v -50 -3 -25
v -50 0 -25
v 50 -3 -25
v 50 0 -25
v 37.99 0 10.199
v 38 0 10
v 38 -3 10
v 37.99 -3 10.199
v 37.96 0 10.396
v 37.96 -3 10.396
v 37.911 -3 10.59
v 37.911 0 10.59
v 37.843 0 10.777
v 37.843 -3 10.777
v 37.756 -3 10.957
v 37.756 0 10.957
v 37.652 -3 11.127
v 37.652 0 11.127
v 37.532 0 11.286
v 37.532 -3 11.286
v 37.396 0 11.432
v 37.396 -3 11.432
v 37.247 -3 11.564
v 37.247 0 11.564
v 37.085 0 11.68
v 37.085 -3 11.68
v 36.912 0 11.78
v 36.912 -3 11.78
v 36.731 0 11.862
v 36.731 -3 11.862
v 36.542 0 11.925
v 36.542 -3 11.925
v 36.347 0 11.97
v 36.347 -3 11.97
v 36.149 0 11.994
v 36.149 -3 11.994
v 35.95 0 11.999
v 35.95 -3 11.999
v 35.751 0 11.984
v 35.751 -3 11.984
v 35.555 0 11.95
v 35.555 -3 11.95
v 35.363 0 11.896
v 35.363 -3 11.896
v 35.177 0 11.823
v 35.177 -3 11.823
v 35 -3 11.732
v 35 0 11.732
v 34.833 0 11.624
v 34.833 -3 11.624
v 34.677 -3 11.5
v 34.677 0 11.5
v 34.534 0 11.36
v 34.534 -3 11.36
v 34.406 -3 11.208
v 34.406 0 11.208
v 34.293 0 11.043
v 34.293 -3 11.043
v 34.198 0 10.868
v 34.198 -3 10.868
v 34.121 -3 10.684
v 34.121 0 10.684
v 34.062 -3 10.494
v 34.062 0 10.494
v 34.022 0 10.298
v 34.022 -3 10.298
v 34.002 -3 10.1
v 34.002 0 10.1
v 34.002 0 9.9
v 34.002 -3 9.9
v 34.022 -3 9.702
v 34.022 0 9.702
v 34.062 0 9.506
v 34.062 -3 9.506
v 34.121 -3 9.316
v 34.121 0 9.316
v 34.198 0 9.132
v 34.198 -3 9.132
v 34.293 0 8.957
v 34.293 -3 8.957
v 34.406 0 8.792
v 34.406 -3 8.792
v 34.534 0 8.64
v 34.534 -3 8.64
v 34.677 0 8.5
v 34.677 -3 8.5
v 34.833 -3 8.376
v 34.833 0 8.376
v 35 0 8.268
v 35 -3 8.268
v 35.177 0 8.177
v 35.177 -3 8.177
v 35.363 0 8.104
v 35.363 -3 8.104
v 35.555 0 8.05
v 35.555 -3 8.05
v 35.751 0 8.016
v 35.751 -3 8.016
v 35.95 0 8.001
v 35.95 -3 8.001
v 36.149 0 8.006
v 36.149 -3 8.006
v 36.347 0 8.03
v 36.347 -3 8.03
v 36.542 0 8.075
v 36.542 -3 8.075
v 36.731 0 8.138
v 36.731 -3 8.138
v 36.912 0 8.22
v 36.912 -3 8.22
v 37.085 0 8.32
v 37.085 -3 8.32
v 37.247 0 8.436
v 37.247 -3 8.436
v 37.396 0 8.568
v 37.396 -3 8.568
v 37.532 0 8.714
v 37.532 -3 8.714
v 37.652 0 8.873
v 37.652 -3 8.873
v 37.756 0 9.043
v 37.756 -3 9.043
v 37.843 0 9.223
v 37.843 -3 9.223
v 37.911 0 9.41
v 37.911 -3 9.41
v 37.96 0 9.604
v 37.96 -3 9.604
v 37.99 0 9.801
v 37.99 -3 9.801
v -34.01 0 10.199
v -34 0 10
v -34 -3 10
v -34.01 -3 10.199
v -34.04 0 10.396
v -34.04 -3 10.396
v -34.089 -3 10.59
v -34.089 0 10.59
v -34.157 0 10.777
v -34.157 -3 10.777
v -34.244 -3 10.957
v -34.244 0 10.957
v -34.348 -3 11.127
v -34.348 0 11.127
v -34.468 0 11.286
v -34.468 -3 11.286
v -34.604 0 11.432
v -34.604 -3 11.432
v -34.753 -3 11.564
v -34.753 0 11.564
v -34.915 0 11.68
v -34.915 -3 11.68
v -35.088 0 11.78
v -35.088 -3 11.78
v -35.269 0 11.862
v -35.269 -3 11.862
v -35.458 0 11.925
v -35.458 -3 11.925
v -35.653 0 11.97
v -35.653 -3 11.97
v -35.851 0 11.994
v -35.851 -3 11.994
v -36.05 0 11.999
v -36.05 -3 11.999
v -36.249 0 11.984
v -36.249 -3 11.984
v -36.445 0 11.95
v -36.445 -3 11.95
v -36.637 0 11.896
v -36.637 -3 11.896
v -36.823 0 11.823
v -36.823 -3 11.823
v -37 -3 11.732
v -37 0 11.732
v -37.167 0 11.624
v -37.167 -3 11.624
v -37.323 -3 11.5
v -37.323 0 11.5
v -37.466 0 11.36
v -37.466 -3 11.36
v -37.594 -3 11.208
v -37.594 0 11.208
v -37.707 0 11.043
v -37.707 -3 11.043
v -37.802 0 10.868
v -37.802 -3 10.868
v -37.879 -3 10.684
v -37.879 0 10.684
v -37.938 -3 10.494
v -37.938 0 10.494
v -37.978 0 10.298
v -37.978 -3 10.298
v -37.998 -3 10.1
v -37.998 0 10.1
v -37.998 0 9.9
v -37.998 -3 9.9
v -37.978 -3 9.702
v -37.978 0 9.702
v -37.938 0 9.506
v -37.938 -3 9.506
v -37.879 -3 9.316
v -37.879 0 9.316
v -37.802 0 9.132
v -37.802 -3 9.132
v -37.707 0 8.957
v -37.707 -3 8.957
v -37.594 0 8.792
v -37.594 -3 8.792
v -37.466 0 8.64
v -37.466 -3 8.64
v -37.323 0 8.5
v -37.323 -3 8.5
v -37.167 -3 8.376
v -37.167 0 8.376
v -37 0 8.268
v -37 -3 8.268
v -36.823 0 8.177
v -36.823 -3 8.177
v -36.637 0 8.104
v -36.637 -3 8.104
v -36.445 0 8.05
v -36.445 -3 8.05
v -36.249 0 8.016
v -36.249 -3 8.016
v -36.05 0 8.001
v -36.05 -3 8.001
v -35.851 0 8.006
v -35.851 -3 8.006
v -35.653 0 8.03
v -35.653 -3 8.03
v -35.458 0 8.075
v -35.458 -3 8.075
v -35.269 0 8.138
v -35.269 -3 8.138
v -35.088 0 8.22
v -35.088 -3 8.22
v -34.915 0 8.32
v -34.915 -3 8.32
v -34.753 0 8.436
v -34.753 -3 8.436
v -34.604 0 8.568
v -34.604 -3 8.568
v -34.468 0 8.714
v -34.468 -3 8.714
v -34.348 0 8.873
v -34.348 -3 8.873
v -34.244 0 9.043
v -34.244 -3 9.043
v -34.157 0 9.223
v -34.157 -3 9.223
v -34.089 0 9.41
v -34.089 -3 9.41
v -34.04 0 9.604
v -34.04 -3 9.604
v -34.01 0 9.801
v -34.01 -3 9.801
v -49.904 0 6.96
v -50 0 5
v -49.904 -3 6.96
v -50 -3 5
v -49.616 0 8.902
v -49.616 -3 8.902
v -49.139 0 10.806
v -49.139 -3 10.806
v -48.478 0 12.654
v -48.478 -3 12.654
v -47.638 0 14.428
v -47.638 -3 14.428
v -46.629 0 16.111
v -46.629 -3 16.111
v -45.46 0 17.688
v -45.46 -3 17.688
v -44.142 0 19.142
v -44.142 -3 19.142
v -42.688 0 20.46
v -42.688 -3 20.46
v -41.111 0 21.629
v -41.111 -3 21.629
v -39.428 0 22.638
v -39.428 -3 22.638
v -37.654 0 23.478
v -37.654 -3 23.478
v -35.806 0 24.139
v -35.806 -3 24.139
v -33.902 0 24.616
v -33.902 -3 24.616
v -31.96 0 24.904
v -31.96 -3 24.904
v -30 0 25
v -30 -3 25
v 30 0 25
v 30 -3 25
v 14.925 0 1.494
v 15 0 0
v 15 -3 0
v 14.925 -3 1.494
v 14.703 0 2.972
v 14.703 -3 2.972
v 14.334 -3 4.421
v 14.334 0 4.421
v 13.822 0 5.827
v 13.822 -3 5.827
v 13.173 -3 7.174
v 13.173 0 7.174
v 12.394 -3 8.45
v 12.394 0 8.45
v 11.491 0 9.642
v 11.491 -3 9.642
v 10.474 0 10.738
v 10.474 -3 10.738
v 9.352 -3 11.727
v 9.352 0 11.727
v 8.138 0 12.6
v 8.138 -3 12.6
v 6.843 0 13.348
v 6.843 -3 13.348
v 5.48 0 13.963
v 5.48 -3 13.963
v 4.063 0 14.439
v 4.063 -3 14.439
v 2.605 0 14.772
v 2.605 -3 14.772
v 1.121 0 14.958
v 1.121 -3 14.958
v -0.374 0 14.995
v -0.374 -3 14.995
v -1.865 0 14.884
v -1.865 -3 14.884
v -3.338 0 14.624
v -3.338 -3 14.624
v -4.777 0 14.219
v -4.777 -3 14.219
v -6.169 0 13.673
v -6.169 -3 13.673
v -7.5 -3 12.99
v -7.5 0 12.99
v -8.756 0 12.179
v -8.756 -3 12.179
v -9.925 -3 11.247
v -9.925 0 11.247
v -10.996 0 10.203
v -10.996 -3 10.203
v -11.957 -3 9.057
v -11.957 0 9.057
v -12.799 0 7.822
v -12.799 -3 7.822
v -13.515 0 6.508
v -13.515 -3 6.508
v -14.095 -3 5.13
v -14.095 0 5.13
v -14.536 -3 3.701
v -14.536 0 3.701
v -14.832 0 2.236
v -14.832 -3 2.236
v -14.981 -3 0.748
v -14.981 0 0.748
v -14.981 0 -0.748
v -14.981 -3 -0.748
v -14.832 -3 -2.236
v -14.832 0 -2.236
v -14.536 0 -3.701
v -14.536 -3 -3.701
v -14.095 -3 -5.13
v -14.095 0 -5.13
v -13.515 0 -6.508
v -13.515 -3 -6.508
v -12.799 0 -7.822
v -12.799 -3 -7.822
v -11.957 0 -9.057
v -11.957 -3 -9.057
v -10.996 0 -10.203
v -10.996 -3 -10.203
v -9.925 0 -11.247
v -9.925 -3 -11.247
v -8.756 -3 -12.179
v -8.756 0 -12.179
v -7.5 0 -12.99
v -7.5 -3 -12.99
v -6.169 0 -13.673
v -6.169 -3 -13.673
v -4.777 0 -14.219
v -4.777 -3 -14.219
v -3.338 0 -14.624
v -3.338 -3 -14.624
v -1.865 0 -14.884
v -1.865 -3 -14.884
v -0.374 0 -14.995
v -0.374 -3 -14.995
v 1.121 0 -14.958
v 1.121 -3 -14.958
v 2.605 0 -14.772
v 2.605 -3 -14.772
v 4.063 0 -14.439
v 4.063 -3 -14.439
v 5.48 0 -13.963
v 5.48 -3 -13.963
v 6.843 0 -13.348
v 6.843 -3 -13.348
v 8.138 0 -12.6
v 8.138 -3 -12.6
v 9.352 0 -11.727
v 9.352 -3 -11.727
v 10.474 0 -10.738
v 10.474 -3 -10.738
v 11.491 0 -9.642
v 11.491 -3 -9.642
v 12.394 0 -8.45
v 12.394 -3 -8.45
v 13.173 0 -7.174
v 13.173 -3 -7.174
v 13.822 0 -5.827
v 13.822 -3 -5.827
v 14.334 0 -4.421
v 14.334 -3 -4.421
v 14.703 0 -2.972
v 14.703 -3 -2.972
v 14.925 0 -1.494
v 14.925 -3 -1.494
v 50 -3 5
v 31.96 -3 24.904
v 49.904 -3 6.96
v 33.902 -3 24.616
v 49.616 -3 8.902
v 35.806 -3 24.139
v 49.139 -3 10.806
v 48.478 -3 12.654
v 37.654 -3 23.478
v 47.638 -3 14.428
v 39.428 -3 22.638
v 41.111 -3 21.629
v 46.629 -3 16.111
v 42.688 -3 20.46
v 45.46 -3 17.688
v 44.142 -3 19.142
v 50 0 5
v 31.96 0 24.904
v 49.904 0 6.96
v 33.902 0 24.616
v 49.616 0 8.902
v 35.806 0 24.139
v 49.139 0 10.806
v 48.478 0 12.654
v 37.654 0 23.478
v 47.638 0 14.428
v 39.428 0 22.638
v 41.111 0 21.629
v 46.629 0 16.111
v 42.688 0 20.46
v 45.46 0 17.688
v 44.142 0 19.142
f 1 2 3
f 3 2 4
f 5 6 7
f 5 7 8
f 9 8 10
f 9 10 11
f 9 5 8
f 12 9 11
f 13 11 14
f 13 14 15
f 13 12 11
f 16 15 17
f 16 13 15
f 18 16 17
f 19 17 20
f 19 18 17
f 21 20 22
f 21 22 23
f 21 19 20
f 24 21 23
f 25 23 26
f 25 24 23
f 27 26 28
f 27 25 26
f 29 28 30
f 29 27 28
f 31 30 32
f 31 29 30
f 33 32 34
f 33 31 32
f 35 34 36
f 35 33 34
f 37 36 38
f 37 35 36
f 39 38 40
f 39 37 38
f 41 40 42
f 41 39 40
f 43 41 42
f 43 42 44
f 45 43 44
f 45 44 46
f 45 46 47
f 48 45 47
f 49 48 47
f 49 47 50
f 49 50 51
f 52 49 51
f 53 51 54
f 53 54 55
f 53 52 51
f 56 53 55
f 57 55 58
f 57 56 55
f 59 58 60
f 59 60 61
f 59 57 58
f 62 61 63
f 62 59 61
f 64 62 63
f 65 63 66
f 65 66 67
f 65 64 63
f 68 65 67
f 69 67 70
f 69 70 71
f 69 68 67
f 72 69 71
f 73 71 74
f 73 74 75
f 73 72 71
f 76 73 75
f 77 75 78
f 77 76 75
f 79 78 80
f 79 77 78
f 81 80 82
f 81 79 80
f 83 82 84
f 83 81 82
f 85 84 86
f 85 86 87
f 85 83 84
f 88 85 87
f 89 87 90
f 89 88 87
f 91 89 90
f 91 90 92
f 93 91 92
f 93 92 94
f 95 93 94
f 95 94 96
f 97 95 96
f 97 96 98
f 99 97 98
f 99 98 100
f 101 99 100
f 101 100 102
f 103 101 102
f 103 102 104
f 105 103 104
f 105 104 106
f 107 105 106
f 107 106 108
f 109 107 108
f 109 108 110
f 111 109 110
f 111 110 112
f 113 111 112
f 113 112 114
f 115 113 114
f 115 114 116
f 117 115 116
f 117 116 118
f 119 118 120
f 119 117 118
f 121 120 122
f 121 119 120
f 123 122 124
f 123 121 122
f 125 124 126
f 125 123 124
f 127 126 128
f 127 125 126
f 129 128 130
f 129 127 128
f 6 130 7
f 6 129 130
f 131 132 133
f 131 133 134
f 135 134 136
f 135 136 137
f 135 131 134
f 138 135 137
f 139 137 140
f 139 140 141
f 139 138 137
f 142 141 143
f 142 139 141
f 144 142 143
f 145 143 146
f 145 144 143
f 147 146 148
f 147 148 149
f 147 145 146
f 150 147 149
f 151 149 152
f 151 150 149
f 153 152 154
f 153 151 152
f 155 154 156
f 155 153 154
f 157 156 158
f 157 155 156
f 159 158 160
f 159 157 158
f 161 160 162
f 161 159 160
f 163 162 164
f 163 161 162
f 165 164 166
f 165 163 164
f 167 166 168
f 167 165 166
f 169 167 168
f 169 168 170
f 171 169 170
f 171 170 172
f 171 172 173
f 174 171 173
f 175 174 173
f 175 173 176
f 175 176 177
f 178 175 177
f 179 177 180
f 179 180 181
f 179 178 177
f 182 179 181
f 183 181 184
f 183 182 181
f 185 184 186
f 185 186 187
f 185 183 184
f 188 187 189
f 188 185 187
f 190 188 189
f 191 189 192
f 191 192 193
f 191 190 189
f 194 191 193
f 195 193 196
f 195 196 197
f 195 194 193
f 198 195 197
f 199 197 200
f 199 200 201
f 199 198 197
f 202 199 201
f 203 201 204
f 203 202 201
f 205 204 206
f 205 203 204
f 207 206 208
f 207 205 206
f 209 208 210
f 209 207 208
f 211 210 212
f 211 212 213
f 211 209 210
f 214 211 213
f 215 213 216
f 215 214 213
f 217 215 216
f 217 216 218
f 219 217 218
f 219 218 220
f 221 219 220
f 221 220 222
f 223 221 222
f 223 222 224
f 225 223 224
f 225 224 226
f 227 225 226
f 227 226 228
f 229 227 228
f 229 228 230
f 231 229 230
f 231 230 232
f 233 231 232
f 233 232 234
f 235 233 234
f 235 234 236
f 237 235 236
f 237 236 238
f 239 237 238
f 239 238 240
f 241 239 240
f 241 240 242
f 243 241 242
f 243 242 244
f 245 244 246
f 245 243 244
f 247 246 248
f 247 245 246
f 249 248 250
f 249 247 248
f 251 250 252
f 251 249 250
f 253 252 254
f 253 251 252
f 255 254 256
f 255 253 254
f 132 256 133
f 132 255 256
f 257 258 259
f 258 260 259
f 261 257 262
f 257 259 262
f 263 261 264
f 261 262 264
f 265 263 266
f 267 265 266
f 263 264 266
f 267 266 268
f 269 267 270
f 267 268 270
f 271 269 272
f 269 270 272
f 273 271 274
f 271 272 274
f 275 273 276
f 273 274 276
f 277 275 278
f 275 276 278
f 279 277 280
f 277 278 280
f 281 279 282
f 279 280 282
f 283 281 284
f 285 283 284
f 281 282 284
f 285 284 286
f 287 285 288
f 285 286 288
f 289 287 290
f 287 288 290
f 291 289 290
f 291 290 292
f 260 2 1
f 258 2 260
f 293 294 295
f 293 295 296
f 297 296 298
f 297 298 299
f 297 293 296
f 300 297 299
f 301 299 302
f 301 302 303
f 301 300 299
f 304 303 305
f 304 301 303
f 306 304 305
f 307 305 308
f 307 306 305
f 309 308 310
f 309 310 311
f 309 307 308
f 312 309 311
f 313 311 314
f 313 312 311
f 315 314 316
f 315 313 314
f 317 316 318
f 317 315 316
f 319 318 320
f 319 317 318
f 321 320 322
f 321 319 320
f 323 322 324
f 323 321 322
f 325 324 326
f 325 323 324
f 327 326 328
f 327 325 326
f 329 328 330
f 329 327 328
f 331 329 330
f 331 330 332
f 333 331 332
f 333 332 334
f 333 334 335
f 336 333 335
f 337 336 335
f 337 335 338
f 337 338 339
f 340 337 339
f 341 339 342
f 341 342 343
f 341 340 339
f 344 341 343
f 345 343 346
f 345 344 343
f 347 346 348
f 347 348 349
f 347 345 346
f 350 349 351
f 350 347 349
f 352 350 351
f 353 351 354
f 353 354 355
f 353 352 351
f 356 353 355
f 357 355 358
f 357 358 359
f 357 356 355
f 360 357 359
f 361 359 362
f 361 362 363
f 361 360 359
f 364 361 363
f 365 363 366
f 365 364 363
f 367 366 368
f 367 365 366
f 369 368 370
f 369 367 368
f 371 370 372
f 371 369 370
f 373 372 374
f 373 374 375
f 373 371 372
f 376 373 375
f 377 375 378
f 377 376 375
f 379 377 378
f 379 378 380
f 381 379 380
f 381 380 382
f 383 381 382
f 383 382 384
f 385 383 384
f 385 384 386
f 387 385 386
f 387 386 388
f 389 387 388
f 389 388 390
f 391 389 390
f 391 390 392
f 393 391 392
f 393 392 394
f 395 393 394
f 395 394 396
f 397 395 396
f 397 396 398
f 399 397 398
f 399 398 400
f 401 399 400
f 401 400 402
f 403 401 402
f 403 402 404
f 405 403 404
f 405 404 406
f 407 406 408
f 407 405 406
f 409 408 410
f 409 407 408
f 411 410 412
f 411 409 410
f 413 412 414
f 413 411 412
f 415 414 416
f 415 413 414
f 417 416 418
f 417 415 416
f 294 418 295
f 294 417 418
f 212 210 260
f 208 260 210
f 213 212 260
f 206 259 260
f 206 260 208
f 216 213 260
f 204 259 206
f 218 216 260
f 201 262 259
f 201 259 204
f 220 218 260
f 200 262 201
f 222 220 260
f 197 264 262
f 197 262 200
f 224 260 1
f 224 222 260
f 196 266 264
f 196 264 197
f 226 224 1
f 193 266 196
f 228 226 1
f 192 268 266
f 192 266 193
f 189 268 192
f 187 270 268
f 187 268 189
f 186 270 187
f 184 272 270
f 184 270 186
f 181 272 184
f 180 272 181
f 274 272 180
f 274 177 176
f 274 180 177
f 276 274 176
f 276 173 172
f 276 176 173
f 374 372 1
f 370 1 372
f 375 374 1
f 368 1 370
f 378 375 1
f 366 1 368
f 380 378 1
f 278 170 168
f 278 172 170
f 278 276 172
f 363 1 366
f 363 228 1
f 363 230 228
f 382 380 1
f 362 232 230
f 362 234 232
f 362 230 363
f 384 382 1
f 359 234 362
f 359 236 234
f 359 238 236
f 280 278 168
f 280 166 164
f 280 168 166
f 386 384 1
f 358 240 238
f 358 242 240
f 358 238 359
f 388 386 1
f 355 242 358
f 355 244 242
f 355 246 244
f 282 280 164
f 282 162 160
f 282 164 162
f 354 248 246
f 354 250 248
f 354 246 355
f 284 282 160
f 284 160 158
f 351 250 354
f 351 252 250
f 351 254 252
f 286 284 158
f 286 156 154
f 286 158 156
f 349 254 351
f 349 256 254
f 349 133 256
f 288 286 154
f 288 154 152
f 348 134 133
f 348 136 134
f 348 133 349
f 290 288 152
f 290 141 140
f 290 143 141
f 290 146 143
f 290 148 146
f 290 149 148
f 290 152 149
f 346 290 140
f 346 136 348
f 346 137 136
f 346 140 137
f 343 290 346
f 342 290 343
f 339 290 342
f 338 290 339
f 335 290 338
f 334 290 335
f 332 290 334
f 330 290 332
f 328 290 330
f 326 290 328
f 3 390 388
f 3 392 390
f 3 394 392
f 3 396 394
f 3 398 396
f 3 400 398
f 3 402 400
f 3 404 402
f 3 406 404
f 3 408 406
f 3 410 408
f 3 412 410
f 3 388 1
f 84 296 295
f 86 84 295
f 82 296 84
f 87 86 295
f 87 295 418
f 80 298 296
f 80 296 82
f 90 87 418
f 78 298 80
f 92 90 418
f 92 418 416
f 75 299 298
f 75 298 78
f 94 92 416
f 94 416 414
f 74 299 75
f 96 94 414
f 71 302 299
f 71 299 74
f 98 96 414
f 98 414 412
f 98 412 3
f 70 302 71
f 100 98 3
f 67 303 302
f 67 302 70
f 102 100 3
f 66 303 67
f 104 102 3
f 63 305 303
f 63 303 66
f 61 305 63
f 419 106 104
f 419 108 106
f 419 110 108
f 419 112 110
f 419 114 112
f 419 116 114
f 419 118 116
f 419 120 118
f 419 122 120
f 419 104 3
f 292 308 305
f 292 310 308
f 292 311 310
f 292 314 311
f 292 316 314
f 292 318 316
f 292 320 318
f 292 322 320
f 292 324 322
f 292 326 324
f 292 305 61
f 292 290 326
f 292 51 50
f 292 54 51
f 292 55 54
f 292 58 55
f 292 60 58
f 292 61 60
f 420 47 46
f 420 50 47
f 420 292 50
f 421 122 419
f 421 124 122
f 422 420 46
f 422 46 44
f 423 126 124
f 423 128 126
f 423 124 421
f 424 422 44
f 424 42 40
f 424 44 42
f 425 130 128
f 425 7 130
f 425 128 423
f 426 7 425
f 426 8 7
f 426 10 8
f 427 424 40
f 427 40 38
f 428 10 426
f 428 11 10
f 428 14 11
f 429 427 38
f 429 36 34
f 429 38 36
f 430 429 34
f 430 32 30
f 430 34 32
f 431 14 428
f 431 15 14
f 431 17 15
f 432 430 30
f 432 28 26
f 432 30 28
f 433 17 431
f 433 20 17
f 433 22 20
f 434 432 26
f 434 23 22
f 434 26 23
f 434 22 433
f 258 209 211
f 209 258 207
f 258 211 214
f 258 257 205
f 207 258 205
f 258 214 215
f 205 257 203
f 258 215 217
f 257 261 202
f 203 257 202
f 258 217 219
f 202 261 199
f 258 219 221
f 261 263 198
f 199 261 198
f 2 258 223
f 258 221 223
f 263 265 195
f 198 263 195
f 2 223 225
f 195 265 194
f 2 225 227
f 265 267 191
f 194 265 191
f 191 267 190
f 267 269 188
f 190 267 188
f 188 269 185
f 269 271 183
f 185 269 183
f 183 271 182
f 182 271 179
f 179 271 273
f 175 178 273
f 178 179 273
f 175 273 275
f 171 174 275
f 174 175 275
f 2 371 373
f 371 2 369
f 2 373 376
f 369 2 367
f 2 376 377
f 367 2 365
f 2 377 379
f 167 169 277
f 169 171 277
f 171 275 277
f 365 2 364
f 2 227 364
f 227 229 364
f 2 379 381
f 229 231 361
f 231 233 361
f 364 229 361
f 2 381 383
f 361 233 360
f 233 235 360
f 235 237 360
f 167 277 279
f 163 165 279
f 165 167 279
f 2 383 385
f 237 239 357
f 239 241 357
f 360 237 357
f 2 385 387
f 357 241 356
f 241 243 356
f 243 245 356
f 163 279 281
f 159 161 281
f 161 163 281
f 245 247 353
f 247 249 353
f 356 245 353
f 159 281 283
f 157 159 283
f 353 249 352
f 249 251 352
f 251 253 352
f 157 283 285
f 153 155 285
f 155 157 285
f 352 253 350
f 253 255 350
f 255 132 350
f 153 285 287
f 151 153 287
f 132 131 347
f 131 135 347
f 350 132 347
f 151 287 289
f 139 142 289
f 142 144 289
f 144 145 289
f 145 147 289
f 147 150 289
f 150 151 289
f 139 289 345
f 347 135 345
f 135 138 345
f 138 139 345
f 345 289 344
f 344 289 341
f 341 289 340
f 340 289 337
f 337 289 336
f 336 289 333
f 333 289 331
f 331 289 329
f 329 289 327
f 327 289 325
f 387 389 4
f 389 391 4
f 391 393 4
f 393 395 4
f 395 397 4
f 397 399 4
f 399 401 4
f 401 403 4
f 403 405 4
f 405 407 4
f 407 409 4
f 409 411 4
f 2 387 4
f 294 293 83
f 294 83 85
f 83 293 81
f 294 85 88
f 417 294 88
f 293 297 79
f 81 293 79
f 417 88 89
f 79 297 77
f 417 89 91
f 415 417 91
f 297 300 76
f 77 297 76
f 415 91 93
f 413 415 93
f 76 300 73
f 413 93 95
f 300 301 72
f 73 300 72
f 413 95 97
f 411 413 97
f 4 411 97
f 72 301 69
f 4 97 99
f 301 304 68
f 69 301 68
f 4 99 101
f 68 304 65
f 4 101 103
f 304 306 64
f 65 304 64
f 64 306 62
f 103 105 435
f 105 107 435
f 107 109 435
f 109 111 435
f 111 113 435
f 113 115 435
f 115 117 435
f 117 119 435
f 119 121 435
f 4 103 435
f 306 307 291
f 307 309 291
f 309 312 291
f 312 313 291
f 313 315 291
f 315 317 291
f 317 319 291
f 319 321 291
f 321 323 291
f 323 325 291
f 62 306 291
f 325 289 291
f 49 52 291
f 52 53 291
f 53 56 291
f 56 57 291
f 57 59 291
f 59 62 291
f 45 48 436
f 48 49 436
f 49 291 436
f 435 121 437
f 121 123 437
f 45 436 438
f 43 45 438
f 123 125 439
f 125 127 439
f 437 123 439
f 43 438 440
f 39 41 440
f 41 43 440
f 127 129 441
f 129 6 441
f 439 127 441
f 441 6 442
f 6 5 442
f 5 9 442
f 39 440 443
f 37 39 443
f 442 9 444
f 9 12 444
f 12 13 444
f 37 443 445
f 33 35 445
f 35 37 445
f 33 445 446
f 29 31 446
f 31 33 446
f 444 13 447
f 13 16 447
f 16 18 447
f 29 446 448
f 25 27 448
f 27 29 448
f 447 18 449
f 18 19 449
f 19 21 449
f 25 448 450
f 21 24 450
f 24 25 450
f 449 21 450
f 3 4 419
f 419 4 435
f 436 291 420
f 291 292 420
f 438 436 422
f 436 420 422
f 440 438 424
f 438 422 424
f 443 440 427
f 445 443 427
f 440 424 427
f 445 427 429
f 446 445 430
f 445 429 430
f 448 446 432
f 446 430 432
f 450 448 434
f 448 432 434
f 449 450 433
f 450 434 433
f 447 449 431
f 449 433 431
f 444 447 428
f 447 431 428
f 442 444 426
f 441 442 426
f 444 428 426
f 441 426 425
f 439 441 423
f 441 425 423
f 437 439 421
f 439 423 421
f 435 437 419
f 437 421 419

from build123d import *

# Parameters (mm, degrees)
F0_W     = 100
F0_H     = 50
F0_R     = 2
F0_R_2   = 15
F1_DEPTH = 3
F2_R     = 20


with BuildPart() as f1:
    # F0 (on Front) → F1 (new body)
    with BuildSketch(Plane.XZ):
        Rectangle(F0_W, F0_H)
        with Locations((-36, 10)):
            Circle(F0_R, mode=Mode.SUBTRACT)
        Circle(F0_R_2, mode=Mode.SUBTRACT)
        with Locations((36, 10)):
            Circle(F0_R, mode=Mode.SUBTRACT)
    extrude(amount=F1_DEPTH)

    # F2
    f2_edges = [f1.edges().sort_by_distance(p)[0] for p in [
        (-50, -1.5, 25),
        (50, -1.5, 25),
    ]]
    fillet(f2_edges, radius=F2_R)


solid = f1.part
